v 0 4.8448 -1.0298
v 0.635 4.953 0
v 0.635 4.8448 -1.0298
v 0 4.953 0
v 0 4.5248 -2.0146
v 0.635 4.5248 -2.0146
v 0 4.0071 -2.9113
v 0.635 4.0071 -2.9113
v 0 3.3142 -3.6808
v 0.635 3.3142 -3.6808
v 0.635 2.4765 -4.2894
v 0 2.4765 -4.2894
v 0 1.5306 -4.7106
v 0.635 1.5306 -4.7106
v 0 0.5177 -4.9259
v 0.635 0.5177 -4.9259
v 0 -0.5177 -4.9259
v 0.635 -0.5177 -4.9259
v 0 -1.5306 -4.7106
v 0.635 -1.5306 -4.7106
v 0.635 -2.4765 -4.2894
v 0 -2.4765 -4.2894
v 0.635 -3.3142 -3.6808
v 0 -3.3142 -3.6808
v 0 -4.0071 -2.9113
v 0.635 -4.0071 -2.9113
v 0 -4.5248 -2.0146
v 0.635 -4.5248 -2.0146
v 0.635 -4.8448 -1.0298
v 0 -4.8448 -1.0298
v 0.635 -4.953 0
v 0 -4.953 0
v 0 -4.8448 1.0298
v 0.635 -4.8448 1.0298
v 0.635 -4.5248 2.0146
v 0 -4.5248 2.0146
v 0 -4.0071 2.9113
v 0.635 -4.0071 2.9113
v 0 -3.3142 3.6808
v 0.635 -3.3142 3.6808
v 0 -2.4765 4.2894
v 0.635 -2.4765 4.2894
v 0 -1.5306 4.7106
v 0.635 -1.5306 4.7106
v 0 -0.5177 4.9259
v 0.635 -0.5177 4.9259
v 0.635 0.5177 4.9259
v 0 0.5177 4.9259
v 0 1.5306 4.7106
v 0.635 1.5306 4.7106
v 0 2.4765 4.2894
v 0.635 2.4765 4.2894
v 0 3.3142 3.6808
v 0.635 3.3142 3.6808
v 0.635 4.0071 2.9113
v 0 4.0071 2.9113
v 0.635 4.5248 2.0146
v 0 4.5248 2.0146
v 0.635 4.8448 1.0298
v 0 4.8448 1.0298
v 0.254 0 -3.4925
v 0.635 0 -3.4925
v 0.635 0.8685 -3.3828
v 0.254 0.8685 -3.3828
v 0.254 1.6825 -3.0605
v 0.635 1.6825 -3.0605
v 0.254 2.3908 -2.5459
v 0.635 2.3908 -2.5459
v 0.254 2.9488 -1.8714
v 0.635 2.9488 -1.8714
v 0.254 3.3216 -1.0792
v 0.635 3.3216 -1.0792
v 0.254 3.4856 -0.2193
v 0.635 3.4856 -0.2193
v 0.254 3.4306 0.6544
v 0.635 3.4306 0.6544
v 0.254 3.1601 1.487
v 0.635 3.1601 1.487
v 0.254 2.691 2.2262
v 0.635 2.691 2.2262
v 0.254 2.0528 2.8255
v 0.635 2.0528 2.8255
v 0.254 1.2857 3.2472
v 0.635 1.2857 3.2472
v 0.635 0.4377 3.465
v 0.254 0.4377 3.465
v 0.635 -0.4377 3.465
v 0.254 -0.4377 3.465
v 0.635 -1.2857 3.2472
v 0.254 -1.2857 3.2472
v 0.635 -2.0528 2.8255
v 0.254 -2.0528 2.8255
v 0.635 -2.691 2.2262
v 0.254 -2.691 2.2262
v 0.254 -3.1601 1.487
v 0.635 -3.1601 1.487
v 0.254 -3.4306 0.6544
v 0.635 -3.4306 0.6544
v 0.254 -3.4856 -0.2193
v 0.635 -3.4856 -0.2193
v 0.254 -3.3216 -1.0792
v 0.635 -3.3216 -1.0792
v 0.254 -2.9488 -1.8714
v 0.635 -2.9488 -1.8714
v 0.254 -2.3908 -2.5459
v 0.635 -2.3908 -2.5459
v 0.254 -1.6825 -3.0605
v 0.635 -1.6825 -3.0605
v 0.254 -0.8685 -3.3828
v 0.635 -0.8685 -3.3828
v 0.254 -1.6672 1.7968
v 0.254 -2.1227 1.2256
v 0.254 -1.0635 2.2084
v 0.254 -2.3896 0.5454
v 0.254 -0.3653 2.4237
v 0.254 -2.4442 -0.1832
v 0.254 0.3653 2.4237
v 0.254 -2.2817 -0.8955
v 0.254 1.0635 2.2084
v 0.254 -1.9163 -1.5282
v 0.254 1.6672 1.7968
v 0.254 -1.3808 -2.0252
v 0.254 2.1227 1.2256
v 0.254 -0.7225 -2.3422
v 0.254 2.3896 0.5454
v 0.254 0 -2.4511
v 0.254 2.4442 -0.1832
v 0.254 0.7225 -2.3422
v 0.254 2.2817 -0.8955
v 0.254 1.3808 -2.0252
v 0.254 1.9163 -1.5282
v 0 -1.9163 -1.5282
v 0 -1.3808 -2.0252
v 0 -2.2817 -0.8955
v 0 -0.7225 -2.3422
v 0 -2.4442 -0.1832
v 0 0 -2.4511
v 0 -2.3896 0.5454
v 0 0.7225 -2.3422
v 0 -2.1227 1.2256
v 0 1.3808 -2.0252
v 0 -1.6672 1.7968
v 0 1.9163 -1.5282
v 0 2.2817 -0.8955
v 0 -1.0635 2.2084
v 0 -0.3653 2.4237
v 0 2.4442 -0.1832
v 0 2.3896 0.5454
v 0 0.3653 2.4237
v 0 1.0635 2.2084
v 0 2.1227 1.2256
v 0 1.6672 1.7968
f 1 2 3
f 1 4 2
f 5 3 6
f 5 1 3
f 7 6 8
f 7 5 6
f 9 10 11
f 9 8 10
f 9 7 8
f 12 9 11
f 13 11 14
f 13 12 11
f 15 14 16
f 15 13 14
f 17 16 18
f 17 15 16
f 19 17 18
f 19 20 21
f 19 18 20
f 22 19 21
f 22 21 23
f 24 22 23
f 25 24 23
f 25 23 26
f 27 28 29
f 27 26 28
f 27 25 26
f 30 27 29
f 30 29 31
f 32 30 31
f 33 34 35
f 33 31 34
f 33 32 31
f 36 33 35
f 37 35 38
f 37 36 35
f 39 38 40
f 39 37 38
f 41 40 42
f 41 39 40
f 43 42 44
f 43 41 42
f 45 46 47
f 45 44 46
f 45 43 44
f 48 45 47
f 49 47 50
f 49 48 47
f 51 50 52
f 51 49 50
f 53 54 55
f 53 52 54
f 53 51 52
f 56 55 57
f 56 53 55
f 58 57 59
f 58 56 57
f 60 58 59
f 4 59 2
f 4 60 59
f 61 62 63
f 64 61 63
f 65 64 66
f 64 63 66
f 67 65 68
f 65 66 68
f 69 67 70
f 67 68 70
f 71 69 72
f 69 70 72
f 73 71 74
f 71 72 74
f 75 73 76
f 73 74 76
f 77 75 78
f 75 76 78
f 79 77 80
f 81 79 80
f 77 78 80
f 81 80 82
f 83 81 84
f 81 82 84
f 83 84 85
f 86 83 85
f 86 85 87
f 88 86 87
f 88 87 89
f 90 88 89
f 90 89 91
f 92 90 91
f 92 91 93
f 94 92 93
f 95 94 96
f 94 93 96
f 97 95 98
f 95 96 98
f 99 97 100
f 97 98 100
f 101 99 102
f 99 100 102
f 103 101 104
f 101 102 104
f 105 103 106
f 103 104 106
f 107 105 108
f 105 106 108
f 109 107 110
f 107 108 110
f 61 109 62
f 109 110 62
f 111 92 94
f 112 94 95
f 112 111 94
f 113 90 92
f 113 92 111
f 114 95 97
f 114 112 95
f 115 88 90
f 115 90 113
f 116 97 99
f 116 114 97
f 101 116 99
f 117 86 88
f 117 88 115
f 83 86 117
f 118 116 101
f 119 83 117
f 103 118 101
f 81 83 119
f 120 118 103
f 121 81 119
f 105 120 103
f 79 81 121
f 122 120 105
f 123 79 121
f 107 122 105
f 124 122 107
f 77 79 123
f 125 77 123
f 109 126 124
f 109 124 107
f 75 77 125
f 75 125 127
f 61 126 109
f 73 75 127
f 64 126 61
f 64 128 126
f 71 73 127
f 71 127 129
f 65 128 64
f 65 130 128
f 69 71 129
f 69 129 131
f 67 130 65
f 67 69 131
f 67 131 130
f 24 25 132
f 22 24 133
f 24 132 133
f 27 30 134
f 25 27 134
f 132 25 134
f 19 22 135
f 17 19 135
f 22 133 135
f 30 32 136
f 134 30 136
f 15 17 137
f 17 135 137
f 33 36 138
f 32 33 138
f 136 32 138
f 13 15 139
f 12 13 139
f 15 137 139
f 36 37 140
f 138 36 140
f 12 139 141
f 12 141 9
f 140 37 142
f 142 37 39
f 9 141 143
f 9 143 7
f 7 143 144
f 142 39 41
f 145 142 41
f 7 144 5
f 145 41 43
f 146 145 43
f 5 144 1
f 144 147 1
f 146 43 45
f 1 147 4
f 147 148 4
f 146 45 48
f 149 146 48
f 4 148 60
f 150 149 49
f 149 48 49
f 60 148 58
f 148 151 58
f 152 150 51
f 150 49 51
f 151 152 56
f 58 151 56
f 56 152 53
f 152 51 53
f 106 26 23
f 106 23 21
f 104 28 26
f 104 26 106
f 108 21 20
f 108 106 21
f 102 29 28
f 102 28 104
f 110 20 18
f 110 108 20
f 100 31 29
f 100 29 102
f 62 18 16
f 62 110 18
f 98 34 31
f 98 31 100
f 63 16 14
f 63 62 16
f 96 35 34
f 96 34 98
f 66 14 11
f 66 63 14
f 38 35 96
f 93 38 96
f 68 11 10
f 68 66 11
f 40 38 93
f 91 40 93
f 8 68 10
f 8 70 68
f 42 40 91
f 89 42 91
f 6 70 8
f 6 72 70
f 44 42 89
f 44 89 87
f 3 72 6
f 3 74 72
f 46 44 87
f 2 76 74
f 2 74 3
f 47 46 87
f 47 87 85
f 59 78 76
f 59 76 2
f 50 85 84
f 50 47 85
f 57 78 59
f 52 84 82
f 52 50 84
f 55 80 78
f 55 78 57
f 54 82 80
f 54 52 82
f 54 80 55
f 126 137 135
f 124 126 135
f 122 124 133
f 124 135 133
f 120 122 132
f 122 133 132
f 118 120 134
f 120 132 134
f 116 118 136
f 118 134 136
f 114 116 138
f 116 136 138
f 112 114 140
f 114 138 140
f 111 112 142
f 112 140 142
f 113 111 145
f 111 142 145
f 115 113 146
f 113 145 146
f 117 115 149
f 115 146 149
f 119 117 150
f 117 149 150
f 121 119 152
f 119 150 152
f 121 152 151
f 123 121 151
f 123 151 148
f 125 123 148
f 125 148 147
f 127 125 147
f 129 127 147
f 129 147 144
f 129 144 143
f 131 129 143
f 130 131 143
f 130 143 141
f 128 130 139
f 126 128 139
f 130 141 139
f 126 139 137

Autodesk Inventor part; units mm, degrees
ref_plane "YZ Plane" through (0, 0, 0) normal (1, 0, 0) x (0, 1, 0)
ref_plane "XZ Plane" through (0, 0, 0) normal (0, 1, 0) x (-1, 0, 0)
ref_plane "XY Plane" through (0, 0, 0) normal (0, 0, 1) x (1, 0, 0)
sketch "Sketch1" plane through (0, 0, 0) normal (1, 0, 0) x (0, 1, 0)
  circle A0 centre (0, 0) radius 4.953
  dimension "d0" = 9.906
extrude "Extrusion1" add sketch "Sketch1" along normal blind 0.635
sketch "Sketch2" plane through (0.635, 0, 0) normal (1, 0, 0) x (0, 0, -1)
  circle A0 centre (0, 0) radius 4.953 projected
  circle A1 centre (0, 0) radius 3.4925
  dimension "d3" = 6.985
extrude "Extrusion2" cut sketch "Sketch2" against normal blind 0.381 contours A1
sketch "Sketch3" plane through (0.254, 0, 0) normal (1, 0, 0) x (0, 0, -1)
  circle A0 centre (0, 0) radius 3.4925 projected
hole "Hole1" at (0.254, 0, 0) direction (-1, 0, 0) diameter 4.9022 end through all
properties part number "Washer"
